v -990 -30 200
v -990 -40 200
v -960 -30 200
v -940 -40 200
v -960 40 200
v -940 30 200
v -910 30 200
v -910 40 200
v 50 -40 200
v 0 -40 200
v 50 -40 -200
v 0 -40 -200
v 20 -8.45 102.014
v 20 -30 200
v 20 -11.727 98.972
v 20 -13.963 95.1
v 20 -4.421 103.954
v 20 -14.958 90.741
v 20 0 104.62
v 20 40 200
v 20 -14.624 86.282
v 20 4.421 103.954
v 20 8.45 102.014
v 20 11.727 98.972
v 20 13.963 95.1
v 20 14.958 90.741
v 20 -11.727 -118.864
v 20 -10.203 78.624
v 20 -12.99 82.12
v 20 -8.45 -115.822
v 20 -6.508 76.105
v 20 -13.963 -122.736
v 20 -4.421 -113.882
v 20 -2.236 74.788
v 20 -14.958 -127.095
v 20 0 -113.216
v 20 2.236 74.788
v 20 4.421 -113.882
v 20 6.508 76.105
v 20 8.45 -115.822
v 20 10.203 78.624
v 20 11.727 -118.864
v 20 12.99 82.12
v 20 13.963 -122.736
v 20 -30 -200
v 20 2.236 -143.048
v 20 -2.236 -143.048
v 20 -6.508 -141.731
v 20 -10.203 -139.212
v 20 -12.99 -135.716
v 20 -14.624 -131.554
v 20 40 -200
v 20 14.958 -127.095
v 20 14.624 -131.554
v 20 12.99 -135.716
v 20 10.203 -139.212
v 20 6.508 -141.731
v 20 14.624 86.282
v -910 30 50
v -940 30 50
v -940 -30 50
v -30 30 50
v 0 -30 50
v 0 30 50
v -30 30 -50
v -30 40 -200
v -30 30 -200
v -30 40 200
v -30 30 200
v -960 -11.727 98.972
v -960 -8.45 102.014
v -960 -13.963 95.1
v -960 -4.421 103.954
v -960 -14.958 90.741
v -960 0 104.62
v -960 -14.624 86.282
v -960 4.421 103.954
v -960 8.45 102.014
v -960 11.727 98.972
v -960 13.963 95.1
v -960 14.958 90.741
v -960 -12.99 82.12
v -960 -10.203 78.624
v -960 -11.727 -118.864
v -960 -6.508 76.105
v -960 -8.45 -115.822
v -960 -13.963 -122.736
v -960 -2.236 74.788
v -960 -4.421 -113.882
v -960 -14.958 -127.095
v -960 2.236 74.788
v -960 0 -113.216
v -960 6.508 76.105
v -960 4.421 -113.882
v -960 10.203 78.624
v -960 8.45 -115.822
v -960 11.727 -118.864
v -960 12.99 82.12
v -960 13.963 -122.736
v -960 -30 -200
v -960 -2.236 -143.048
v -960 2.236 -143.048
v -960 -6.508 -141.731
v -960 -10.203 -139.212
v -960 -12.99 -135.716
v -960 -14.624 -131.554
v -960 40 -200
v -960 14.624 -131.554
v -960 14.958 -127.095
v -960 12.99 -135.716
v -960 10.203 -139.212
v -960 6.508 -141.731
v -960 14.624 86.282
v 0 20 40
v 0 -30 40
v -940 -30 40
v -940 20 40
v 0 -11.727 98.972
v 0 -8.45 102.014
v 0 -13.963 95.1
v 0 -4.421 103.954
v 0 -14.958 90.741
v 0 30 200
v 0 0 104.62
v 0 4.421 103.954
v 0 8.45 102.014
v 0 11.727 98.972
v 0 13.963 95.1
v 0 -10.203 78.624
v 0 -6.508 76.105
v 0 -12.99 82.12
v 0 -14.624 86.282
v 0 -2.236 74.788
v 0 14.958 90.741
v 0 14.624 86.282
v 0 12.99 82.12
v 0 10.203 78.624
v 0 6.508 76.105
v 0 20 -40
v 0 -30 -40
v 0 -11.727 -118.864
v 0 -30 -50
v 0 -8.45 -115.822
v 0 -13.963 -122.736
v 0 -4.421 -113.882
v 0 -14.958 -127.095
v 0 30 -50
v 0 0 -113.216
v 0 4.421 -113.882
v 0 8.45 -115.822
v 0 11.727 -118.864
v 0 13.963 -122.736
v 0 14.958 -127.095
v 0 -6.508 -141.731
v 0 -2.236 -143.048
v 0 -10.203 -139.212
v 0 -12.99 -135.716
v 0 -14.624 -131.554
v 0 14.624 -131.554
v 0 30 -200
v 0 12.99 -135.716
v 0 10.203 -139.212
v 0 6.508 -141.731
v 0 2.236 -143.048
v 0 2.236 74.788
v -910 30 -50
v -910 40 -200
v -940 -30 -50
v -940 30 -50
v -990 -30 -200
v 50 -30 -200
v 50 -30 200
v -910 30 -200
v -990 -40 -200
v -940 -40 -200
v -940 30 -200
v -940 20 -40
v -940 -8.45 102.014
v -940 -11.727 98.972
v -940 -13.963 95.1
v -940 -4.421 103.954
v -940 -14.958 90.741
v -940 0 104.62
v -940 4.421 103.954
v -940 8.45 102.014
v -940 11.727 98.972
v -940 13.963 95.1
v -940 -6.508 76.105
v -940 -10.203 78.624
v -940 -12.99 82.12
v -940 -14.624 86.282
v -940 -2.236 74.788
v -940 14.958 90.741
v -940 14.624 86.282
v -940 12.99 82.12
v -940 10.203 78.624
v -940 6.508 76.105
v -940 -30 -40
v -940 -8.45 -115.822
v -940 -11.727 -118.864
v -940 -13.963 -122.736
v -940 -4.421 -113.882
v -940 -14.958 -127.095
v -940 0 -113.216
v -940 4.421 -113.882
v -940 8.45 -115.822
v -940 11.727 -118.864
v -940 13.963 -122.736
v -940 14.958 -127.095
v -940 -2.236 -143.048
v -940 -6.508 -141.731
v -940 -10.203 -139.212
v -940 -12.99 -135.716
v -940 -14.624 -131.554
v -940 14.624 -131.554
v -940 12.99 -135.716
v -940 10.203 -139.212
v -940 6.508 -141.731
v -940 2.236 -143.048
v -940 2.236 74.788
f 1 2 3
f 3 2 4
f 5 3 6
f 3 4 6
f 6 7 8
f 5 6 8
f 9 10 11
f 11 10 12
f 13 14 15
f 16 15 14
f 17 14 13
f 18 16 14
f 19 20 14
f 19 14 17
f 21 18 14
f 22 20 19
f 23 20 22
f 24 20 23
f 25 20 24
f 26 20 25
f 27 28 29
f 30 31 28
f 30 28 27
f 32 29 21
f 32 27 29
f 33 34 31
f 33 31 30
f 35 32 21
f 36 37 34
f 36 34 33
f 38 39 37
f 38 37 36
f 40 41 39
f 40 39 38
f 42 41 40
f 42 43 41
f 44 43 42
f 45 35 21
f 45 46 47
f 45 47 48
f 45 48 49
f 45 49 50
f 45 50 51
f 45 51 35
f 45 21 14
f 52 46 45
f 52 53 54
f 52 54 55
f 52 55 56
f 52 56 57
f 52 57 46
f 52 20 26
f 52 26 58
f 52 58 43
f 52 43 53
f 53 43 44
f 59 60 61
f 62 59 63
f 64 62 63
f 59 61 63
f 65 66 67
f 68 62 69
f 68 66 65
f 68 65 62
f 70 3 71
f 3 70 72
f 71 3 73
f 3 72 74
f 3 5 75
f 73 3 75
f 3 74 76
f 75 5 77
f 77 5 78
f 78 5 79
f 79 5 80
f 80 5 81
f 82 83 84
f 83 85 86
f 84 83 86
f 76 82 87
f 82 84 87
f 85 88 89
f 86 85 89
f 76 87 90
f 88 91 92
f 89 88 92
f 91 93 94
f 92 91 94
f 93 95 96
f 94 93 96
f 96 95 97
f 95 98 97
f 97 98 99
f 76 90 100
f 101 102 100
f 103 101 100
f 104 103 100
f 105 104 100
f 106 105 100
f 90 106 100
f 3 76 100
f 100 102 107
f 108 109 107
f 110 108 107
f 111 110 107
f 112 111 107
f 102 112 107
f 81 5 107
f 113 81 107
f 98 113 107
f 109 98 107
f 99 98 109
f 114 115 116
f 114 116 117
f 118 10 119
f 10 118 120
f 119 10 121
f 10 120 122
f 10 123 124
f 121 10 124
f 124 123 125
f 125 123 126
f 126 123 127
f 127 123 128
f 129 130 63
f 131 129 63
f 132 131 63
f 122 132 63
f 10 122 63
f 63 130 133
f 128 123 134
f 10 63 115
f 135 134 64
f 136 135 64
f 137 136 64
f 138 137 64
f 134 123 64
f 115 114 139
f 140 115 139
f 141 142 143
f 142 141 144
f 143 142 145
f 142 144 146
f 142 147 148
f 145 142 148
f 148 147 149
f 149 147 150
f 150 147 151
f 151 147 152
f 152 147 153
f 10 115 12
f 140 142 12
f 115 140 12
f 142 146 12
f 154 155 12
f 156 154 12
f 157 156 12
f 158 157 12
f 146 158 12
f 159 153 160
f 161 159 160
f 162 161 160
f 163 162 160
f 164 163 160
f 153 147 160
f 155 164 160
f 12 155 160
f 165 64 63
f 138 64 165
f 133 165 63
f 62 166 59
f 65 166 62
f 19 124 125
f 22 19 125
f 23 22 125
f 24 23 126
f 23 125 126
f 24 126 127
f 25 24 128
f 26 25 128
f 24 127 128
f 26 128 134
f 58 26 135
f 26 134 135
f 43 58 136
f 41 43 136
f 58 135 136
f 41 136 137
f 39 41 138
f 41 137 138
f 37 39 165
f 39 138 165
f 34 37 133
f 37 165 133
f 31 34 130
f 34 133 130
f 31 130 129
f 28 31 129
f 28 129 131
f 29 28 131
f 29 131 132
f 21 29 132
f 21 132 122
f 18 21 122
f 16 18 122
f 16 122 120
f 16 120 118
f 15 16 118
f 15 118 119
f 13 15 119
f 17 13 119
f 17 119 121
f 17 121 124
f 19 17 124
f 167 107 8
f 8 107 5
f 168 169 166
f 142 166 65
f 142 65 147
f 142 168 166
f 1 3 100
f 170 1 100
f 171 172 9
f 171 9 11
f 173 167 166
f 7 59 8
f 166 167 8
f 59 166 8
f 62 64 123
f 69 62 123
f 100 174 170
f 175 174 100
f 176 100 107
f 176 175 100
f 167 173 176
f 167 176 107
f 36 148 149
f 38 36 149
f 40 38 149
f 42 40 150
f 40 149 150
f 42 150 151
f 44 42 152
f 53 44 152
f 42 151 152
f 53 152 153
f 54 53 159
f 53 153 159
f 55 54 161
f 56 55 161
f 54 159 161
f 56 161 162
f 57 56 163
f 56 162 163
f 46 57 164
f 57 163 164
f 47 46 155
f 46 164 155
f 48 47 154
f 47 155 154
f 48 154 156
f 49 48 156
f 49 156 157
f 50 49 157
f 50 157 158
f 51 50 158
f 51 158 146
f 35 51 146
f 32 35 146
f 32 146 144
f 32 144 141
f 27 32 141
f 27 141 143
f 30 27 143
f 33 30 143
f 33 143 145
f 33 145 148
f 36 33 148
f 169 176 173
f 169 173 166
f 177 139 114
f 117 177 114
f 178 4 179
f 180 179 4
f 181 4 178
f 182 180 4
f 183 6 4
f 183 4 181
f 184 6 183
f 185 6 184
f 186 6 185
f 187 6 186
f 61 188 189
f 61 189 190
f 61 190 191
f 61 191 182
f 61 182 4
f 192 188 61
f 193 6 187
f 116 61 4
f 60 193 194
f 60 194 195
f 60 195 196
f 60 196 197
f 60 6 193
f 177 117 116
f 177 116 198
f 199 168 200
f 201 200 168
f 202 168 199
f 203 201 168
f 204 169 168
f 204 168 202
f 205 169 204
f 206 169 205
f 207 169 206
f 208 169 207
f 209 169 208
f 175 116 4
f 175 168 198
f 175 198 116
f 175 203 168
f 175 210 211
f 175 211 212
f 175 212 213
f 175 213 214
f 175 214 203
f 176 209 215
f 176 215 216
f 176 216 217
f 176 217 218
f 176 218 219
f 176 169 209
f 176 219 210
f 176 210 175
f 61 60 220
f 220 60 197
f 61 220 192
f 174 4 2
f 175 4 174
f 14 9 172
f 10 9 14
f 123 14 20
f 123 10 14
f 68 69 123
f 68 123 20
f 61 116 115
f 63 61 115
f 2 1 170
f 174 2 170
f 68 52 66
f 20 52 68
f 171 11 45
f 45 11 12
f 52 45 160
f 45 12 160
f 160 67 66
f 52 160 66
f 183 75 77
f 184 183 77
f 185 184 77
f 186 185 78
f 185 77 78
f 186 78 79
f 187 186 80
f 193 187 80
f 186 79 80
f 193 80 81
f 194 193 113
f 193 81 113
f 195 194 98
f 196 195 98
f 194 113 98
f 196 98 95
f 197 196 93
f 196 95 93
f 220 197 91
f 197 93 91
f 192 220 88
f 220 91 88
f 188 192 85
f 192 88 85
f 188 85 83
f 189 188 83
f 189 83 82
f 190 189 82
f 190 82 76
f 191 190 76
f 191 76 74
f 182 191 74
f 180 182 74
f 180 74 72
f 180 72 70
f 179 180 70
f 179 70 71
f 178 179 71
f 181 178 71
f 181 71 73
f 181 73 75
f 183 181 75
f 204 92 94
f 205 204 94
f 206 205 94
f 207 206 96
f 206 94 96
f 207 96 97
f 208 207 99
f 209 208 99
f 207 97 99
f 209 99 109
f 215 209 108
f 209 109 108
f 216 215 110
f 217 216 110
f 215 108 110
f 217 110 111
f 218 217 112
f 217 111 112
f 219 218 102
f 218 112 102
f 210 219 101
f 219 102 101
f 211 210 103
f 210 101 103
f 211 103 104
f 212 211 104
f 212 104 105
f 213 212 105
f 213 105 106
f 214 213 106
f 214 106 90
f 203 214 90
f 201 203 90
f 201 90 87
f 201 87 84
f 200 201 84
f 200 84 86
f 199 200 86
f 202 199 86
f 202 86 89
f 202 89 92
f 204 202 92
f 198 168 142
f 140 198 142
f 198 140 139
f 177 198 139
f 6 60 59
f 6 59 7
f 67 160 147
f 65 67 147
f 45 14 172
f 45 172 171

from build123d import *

# Parameters (mm, degrees)
SKETCH1_W           = 400
SKETCH1_H           = 80
BOSS_EXTRUDE1_DEPTH = 20
SKETCH5_W           = 400
SKETCH5_H           = 10
BOSS_EXTRUDE2_DEPTH = 30
SKETCH7_W           = 400
SKETCH7_H           = 10
BOSS_EXTRUDE3_DEPTH = 30
BOSS_EXTRUDE4_START = -20
SKETCH8_W           = 100
SKETCH8_H           = 60
BOSS_EXTRUDE4_DEPTH = 490
SKETCH9_W           = 80
SKETCH9_H           = 50
CUT_EXTRUDE1_DEPTH  = 940
SKETCH11_W          = 80
SKETCH11_H          = 50
BOSS_EXTRUDE5_DEPTH = 20
MIRROR20_START      = -30
MIRROR20_OUTLINE_W  = 490
MIRROR20_OUTLINE_H  = 100
MIRROR20_DEPTH      = 60
SKETCH12_R          = 15
CUT_EXTRUDE2_DEPTH  = 1031.388276331
SKETCH19_R          = 15
CUT_EXTRUDE10_DEPTH = 1031.388276331


# Read off the part's stored shape, not the designer's step: Mirror20
with BuildPart() as part:
    # Sketch1 → Boss-Extrude1 (new body)
    with BuildSketch(Plane(origin=(0, 0, 0), x_dir=(0, 0, -1), z_dir=(1, 0, 0))):
        Rectangle(SKETCH1_W, SKETCH1_H)
    boss_extrude1 = extrude(amount=BOSS_EXTRUDE1_DEPTH)

    # Sketch5 → Boss-Extrude2 (add)
    with BuildSketch(Plane.ZY):
        with Locations((0, 35)):
            Rectangle(SKETCH5_W, SKETCH5_H)
    boss_extrude2 = extrude(amount=BOSS_EXTRUDE2_DEPTH)

    # Sketch7 → Boss-Extrude3 (add)
    with BuildSketch(Plane(origin=(20, 0, 0), x_dir=(0, 0, -1), z_dir=(1, 0, 0))):
        with Locations((0, -35)):
            Rectangle(SKETCH7_W, SKETCH7_H)
    boss_extrude3 = extrude(amount=BOSS_EXTRUDE3_DEPTH)

    # Sketch8 → Boss-Extrude4 (add)
    with BuildSketch(Plane.ZY.offset(BOSS_EXTRUDE4_START)):
        Rectangle(SKETCH8_W, SKETCH8_H)
    extrude(amount=BOSS_EXTRUDE4_DEPTH)

    # Sketch9 → Cut-Extrude1 (cut)
    with BuildSketch(Plane.ZY.offset(470)):
        with Locations((0, -5)):
            Rectangle(SKETCH9_W, SKETCH9_H)
    cut_extrude1 = extrude(amount=-CUT_EXTRUDE1_DEPTH, mode=Mode.SUBTRACT)

    # Sketch11 → Boss-Extrude5 (add)
    with BuildSketch(Plane(origin=(20, 0, 0), x_dir=(0, 0, -1), z_dir=(1, 0, 0))):
        with Locations((0, -5)):
            Rectangle(SKETCH11_W, SKETCH11_H)
    boss_extrude5 = extrude(amount=-BOSS_EXTRUDE5_DEPTH)

    # Mirror20 outline → Mirror20 (add)
    with BuildSketch(Plane(origin=(0, 0, 0), x_dir=(1, 0, 0), z_dir=(0, 1, 0)).offset(MIRROR20_START)):
        with Locations((-715, 0)):
            Rectangle(MIRROR20_OUTLINE_W, MIRROR20_OUTLINE_H)
    extrude(amount=MIRROR20_DEPTH)

    # Mirror22: Boss-Extrude1, Boss-Extrude2, Boss-Extrude3, Cut-Extrude1, Boss-Extrude5 across plane
    add(boss_extrude1.mirror(Plane.ZY.offset(470)))
    add(boss_extrude2.mirror(Plane.ZY.offset(470)))
    add(boss_extrude3.mirror(Plane.ZY.offset(470)))
    add(cut_extrude1.mirror(Plane.ZY.offset(470)), mode=Mode.SUBTRACT)
    add(boss_extrude5.mirror(Plane.ZY.offset(470)))

    # Sketch12 → Cut-Extrude2 (cut, through all)
    with BuildSketch(Plane.ZY.offset(960)):
        with Locations((89.62, 0)):
            Circle(SKETCH12_R)
    extrude(amount=-CUT_EXTRUDE2_DEPTH, mode=Mode.SUBTRACT)

    # Sketch19 → Cut-Extrude10 (cut, through all)
    with BuildSketch(Plane.ZY.offset(960)):
        with Locations((-128.216, 0)):
            Circle(SKETCH19_R)
    extrude(amount=-CUT_EXTRUDE10_DEPTH, mode=Mode.SUBTRACT)


solid = part.part
